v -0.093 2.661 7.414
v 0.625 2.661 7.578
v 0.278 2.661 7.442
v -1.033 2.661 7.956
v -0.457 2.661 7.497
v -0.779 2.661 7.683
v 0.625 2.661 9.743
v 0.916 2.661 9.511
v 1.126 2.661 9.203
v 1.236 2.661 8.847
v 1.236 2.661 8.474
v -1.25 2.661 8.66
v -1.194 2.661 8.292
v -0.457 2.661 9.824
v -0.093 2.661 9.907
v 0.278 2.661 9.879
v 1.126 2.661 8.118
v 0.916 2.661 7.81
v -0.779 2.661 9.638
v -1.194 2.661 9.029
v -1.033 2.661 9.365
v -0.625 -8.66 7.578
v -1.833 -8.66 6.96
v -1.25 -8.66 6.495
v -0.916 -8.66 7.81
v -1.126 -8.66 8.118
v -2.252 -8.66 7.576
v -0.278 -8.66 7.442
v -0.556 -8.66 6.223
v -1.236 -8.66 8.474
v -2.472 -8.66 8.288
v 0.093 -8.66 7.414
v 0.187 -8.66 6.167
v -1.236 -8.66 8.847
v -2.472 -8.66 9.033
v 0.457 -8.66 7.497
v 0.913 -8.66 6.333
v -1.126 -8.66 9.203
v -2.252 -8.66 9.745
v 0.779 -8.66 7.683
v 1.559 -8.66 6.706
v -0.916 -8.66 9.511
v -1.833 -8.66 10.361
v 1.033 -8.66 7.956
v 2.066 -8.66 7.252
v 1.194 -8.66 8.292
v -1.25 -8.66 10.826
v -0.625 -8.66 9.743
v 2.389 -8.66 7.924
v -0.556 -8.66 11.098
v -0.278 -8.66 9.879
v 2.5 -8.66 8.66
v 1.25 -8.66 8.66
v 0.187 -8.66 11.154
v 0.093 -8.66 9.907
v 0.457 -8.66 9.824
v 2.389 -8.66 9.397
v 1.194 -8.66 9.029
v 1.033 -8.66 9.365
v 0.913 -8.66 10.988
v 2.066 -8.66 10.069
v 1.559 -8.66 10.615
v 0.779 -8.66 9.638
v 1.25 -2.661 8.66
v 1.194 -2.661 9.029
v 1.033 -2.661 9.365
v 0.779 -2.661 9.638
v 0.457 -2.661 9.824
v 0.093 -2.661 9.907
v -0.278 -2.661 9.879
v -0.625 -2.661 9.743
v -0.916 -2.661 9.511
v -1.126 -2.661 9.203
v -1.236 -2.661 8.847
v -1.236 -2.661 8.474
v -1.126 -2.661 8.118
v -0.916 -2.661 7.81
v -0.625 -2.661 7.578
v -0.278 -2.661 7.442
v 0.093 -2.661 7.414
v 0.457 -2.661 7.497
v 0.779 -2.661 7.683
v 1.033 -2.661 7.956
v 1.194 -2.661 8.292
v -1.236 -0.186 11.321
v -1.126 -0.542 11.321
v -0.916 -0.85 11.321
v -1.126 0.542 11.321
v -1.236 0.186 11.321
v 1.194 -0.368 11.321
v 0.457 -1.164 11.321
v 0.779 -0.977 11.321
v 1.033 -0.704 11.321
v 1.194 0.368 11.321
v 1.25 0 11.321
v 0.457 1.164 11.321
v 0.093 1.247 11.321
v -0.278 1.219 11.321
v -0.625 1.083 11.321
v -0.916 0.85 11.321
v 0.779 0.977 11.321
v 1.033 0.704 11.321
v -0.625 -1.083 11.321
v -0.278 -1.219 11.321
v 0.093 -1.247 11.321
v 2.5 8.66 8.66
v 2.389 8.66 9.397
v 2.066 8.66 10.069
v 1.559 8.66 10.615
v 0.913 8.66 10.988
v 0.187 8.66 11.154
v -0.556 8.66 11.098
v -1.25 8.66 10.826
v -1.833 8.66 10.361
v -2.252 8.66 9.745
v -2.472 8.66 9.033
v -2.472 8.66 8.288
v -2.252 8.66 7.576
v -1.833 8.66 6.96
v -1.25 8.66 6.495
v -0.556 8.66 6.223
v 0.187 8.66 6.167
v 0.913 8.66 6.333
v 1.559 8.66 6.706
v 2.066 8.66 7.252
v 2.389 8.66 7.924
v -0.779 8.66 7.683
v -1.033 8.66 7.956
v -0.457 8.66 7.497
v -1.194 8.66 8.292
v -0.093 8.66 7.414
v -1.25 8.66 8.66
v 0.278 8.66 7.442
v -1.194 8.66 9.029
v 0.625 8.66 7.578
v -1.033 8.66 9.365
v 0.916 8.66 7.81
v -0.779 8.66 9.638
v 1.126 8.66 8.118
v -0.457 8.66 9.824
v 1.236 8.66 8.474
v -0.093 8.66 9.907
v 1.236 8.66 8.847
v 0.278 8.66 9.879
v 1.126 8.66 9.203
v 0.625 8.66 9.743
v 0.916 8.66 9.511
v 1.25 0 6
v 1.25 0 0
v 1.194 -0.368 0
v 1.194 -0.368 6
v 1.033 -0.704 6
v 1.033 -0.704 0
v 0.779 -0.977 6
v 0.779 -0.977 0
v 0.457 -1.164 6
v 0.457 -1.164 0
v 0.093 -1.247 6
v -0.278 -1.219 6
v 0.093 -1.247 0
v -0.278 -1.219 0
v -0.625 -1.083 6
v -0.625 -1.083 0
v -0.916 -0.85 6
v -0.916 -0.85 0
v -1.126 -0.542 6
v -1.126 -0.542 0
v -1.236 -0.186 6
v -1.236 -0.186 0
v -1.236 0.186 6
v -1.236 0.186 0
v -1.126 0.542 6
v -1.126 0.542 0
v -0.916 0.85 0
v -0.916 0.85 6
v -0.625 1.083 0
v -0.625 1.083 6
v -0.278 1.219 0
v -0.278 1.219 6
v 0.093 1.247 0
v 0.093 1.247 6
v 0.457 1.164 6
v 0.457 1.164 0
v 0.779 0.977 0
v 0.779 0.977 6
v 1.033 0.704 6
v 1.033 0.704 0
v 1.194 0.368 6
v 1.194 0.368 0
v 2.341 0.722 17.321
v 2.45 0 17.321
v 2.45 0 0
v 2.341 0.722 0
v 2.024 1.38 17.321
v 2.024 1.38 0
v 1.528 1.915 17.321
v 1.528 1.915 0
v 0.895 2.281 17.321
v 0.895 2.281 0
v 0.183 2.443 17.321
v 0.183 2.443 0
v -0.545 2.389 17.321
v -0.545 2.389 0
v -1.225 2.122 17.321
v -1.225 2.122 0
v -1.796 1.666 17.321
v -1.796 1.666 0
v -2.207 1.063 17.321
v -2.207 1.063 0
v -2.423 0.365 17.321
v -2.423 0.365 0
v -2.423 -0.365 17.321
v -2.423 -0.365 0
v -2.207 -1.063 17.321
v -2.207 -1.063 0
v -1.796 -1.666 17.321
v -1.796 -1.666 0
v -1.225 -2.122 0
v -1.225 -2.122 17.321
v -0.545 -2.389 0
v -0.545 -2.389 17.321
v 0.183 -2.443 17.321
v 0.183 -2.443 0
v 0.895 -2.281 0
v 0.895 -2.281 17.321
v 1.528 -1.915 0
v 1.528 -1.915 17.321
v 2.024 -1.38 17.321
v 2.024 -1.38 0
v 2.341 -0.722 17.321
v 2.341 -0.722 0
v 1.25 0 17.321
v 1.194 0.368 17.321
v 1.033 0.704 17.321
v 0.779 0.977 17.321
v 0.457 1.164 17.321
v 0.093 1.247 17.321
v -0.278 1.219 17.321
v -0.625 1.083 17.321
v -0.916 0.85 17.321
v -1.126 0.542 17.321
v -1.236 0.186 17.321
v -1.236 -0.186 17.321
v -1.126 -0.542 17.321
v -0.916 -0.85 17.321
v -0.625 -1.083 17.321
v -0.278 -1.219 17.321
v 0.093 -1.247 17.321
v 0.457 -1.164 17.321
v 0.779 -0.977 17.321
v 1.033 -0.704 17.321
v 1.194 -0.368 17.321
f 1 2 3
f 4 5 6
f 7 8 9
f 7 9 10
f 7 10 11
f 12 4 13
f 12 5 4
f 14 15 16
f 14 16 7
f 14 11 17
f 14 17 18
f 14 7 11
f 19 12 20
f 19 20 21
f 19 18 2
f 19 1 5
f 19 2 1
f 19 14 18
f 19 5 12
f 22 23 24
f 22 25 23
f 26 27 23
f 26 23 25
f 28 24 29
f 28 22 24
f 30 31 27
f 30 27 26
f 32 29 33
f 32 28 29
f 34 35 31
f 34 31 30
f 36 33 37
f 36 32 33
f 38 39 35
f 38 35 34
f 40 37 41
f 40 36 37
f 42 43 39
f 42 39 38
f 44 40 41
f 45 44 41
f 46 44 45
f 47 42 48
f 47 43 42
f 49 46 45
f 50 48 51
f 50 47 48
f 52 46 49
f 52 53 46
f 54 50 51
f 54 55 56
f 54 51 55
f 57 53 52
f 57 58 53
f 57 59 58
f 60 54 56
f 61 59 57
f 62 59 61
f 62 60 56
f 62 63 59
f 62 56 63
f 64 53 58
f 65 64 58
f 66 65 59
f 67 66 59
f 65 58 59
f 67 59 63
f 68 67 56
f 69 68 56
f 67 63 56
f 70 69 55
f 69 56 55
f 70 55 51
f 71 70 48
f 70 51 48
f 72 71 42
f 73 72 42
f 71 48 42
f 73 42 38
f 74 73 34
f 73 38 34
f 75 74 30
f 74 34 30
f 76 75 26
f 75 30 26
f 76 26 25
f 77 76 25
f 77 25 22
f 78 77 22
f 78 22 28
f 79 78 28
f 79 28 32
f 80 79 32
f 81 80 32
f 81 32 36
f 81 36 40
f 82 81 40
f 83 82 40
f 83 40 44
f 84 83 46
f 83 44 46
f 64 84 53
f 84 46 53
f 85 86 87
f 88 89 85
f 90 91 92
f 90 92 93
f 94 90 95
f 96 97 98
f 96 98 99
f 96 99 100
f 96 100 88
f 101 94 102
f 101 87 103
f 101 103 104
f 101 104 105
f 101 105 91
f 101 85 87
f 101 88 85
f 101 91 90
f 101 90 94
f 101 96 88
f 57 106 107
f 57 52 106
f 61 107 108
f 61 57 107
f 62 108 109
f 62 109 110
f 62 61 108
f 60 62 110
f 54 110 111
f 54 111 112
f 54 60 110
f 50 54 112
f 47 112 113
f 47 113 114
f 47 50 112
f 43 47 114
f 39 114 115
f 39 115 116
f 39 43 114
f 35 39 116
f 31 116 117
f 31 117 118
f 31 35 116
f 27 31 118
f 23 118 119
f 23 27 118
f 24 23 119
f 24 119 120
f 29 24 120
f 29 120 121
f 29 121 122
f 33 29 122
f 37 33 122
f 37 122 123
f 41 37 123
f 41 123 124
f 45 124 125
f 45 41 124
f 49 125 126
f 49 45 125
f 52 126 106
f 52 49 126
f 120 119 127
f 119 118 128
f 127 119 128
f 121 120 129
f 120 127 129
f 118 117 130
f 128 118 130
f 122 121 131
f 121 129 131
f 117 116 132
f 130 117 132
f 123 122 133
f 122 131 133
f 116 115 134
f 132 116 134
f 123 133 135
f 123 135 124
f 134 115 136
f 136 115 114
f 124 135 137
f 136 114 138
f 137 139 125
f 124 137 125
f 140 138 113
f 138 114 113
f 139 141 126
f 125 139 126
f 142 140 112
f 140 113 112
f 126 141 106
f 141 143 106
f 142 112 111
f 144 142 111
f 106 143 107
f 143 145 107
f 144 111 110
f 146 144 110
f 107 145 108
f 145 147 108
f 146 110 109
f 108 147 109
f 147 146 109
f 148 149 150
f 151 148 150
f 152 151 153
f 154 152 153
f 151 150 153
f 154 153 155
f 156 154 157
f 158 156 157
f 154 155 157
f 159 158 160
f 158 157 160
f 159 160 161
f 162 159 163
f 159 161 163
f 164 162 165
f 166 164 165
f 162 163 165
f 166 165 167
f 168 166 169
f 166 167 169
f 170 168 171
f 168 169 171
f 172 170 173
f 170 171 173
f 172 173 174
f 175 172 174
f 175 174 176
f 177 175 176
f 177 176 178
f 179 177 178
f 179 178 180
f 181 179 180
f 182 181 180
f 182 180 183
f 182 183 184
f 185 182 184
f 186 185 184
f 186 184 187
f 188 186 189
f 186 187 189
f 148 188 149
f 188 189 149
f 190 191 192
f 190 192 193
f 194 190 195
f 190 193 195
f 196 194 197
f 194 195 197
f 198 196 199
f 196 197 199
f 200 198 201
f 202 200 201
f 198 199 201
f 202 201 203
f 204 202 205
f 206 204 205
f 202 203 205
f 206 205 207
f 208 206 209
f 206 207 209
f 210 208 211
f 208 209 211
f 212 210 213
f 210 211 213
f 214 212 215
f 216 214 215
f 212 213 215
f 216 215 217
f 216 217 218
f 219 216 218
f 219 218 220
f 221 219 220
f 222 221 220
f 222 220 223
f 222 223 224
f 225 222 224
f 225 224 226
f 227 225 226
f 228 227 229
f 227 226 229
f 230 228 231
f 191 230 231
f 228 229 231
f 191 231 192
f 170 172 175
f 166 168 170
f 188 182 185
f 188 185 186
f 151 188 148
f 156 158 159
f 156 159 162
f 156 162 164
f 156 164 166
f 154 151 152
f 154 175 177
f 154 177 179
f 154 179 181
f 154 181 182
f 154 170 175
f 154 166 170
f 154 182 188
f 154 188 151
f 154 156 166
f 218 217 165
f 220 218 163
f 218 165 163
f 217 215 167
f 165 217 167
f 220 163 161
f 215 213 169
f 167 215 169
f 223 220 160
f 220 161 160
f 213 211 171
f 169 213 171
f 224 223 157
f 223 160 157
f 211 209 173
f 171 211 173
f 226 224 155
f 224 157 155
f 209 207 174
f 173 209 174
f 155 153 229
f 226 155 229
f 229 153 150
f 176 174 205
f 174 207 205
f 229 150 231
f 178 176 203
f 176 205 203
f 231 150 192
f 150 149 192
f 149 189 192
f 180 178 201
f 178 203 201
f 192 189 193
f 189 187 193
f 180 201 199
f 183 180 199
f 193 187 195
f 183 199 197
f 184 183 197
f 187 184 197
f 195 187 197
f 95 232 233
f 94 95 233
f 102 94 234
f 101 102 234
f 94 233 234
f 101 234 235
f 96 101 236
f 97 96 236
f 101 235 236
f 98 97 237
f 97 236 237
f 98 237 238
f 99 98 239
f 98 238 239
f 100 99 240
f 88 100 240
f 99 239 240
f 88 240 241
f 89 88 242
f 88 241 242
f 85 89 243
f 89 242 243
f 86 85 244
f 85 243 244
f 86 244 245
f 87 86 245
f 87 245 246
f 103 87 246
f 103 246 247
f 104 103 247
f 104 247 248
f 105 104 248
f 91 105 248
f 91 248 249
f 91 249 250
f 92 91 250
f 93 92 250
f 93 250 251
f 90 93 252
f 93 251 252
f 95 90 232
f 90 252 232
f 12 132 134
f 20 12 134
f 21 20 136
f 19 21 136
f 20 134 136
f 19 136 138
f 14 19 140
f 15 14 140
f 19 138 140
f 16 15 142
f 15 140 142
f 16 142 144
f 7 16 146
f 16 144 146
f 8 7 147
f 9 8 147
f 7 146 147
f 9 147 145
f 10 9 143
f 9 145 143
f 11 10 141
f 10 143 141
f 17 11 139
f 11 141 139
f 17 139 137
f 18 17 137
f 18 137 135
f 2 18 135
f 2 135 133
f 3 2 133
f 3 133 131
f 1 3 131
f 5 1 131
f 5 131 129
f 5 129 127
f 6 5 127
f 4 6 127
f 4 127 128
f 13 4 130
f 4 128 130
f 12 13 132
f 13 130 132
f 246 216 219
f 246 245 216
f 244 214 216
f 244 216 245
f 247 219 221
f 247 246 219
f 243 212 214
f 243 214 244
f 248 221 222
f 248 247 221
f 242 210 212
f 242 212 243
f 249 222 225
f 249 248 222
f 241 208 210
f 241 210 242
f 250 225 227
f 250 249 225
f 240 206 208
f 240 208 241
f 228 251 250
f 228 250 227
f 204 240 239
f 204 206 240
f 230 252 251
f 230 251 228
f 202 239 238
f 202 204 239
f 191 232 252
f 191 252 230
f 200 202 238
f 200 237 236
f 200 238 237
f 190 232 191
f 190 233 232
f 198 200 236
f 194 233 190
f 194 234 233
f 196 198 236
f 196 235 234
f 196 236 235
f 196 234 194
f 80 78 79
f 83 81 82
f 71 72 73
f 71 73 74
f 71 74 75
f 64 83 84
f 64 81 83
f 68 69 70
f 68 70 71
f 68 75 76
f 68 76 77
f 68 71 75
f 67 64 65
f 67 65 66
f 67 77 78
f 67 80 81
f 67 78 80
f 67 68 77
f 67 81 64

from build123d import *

# Parameters (mm, degrees)
F0_R          = 2.45
F1_DEPTH      = 17.321
F2_R          = 1.25
F3_DEPTH      = 6
F4_R          = 2.5
F5_DEPTH      = 8.6605
F5_DEPTH_BACK = 8.6605
F6_R          = 1.25
F7_DEPTH      = 6
F8_R          = 1.25
F9_DEPTH      = 6
F10_R         = 1.25
F11_DEPTH     = 6


# Not quite as in the source:
# - a feature names something its author has since deleted; it is built from what else it names


with BuildPart() as f1:
    # F0 (on Top) → F1 (new body)
    with BuildSketch(Plane.XY):
        Circle(F0_R)
    extrude(amount=F1_DEPTH)

    # F2 (on face) → F3 (cut)
    with BuildSketch(Plane.XY.offset(17.321)):
        Circle(F2_R)
    extrude(amount=-F3_DEPTH, mode=Mode.SUBTRACT)

    # F6 (on face) → F7 (cut)
    with BuildSketch(Plane(origin=(0, 0, 0), x_dir=(1, 0, 0), z_dir=(0, 0, -1))):
        Circle(F6_R)
    extrude(amount=-F7_DEPTH, mode=Mode.SUBTRACT)


with BuildPart() as f5:
    # F4 (on Front) → F5 (new body, two sides)
    with BuildSketch(Plane.XZ) as f5_sk:
        with Locations((0, 8.6605)):
            Circle(F4_R)
    extrude(amount=F5_DEPTH)
    extrude(f5_sk.sketch, amount=-F5_DEPTH_BACK)

    # F8 (on face) → F9 (cut)
    with BuildSketch(Plane.XZ.offset(8.6605)):
        with Locations((0, 8.6605)):
            Circle(F8_R)
    extrude(amount=-F9_DEPTH, mode=Mode.SUBTRACT)

    # F10 (on face) → F11 (cut)
    with BuildSketch(Plane(origin=(0, 8.6605, 0), x_dir=(-1, 0, 0), z_dir=(0, 1, 0))):
        with Locations((0, 8.6605)):
            Circle(F10_R)
    extrude(amount=-F11_DEPTH, mode=Mode.SUBTRACT)


solid = Compound([f1.part, f5.part])
